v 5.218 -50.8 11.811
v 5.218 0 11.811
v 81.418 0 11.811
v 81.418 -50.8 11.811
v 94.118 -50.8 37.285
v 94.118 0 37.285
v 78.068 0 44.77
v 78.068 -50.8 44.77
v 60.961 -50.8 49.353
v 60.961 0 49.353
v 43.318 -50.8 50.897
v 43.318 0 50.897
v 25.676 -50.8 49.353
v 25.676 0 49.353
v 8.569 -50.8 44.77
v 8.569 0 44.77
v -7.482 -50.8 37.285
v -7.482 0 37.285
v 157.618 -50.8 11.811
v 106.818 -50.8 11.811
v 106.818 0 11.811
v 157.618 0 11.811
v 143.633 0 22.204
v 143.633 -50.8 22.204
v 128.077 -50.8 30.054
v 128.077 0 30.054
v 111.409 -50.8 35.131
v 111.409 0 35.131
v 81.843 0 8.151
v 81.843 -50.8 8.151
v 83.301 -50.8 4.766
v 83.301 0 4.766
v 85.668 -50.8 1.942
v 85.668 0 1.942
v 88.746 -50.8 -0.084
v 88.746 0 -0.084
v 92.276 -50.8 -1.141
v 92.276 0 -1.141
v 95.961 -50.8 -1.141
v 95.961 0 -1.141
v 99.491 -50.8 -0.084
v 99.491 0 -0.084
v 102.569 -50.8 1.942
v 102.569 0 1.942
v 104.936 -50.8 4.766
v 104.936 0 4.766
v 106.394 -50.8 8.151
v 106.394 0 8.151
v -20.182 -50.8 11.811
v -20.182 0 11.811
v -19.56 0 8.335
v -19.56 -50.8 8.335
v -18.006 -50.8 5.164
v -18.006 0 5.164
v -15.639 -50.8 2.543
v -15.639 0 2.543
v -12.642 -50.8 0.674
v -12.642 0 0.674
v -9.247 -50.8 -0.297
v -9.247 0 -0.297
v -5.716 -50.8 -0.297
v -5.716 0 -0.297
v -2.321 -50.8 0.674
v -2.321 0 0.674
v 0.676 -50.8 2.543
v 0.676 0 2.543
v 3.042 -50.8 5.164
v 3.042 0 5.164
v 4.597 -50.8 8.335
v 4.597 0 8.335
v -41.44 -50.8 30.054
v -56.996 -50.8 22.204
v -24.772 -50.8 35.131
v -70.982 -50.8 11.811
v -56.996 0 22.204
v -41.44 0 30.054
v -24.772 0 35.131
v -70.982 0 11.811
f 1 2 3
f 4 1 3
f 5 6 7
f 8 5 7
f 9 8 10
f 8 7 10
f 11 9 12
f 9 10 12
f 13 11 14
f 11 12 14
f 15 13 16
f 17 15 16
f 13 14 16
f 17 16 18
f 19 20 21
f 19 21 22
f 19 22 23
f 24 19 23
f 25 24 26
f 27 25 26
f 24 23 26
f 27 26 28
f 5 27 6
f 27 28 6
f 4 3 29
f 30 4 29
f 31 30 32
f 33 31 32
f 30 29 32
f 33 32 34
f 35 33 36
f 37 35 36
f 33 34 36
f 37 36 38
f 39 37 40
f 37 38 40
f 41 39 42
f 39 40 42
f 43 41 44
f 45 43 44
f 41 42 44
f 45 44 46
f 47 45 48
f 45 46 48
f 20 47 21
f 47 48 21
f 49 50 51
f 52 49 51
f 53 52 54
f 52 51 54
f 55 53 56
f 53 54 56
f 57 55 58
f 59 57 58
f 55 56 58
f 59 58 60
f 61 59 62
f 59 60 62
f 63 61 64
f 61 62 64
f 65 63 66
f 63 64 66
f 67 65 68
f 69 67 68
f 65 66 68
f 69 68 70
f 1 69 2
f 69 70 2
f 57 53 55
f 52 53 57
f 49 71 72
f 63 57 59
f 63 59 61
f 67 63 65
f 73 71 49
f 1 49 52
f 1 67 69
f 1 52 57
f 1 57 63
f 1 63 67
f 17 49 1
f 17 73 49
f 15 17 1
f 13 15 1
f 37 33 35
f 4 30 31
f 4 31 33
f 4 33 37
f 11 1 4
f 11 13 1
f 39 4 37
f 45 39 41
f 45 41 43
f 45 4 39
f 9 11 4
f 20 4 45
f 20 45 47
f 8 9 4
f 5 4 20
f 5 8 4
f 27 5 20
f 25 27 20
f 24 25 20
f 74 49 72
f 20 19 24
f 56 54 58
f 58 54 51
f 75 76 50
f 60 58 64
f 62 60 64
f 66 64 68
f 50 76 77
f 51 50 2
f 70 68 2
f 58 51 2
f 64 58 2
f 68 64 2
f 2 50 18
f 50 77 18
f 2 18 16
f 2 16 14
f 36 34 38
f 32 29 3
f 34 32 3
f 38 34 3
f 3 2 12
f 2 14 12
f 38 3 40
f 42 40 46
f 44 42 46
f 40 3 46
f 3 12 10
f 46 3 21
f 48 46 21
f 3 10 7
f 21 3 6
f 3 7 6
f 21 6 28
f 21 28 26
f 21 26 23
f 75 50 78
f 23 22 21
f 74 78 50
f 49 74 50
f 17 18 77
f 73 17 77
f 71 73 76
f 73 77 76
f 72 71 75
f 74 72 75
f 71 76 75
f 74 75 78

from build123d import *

# Parameters (mm, degrees)
F1_DEPTH = 50.8


with BuildPart() as f1:
    # F0 (on Front) → F1 (new body)
    with BuildSketch(Plane.XZ):
        with BuildLine():
            ThreePointArc((-7.481652, 37.285154), (-41.440481, 30.054075), (-70.981652, 11.811))
            Line((-70.981652, 11.811), (-20.181652, 11.811))
            ThreePointArc((-20.181652, 11.811), (-7.481652, 24.455001), (5.218348, 11.811))
            Line((5.218348, 11.811), (81.418348, 11.811))
            ThreePointArc((81.418348, 11.811), (94.118348, 24.369807), (106.818348, 11.811))
            Line((106.818348, 11.811), (157.618348, 11.811))
            ThreePointArc((157.618348, 11.811), (128.077177, 30.054075), (94.118348, 37.285154))
            ThreePointArc((94.118348, 37.285154), (43.318348, 50.896973), (-7.481652, 37.285154))
        make_face()
        with BuildLine():
            ThreePointArc((5.218348, 11.811), (-7.481652, 24.455001), (-20.181652, 11.811))
            ThreePointArc((-20.181652, 11.811), (-7.481652, -0.420556), (5.218348, 11.811))
        make_face()
        with BuildLine():
            ThreePointArc((106.818348, 11.811), (94.118348, 24.369807), (81.418348, 11.811))
            ThreePointArc((81.418348, 11.811), (94.118348, -1.27557), (106.818348, 11.811))
        make_face()
    extrude(amount=F1_DEPTH)


solid = f1.part
